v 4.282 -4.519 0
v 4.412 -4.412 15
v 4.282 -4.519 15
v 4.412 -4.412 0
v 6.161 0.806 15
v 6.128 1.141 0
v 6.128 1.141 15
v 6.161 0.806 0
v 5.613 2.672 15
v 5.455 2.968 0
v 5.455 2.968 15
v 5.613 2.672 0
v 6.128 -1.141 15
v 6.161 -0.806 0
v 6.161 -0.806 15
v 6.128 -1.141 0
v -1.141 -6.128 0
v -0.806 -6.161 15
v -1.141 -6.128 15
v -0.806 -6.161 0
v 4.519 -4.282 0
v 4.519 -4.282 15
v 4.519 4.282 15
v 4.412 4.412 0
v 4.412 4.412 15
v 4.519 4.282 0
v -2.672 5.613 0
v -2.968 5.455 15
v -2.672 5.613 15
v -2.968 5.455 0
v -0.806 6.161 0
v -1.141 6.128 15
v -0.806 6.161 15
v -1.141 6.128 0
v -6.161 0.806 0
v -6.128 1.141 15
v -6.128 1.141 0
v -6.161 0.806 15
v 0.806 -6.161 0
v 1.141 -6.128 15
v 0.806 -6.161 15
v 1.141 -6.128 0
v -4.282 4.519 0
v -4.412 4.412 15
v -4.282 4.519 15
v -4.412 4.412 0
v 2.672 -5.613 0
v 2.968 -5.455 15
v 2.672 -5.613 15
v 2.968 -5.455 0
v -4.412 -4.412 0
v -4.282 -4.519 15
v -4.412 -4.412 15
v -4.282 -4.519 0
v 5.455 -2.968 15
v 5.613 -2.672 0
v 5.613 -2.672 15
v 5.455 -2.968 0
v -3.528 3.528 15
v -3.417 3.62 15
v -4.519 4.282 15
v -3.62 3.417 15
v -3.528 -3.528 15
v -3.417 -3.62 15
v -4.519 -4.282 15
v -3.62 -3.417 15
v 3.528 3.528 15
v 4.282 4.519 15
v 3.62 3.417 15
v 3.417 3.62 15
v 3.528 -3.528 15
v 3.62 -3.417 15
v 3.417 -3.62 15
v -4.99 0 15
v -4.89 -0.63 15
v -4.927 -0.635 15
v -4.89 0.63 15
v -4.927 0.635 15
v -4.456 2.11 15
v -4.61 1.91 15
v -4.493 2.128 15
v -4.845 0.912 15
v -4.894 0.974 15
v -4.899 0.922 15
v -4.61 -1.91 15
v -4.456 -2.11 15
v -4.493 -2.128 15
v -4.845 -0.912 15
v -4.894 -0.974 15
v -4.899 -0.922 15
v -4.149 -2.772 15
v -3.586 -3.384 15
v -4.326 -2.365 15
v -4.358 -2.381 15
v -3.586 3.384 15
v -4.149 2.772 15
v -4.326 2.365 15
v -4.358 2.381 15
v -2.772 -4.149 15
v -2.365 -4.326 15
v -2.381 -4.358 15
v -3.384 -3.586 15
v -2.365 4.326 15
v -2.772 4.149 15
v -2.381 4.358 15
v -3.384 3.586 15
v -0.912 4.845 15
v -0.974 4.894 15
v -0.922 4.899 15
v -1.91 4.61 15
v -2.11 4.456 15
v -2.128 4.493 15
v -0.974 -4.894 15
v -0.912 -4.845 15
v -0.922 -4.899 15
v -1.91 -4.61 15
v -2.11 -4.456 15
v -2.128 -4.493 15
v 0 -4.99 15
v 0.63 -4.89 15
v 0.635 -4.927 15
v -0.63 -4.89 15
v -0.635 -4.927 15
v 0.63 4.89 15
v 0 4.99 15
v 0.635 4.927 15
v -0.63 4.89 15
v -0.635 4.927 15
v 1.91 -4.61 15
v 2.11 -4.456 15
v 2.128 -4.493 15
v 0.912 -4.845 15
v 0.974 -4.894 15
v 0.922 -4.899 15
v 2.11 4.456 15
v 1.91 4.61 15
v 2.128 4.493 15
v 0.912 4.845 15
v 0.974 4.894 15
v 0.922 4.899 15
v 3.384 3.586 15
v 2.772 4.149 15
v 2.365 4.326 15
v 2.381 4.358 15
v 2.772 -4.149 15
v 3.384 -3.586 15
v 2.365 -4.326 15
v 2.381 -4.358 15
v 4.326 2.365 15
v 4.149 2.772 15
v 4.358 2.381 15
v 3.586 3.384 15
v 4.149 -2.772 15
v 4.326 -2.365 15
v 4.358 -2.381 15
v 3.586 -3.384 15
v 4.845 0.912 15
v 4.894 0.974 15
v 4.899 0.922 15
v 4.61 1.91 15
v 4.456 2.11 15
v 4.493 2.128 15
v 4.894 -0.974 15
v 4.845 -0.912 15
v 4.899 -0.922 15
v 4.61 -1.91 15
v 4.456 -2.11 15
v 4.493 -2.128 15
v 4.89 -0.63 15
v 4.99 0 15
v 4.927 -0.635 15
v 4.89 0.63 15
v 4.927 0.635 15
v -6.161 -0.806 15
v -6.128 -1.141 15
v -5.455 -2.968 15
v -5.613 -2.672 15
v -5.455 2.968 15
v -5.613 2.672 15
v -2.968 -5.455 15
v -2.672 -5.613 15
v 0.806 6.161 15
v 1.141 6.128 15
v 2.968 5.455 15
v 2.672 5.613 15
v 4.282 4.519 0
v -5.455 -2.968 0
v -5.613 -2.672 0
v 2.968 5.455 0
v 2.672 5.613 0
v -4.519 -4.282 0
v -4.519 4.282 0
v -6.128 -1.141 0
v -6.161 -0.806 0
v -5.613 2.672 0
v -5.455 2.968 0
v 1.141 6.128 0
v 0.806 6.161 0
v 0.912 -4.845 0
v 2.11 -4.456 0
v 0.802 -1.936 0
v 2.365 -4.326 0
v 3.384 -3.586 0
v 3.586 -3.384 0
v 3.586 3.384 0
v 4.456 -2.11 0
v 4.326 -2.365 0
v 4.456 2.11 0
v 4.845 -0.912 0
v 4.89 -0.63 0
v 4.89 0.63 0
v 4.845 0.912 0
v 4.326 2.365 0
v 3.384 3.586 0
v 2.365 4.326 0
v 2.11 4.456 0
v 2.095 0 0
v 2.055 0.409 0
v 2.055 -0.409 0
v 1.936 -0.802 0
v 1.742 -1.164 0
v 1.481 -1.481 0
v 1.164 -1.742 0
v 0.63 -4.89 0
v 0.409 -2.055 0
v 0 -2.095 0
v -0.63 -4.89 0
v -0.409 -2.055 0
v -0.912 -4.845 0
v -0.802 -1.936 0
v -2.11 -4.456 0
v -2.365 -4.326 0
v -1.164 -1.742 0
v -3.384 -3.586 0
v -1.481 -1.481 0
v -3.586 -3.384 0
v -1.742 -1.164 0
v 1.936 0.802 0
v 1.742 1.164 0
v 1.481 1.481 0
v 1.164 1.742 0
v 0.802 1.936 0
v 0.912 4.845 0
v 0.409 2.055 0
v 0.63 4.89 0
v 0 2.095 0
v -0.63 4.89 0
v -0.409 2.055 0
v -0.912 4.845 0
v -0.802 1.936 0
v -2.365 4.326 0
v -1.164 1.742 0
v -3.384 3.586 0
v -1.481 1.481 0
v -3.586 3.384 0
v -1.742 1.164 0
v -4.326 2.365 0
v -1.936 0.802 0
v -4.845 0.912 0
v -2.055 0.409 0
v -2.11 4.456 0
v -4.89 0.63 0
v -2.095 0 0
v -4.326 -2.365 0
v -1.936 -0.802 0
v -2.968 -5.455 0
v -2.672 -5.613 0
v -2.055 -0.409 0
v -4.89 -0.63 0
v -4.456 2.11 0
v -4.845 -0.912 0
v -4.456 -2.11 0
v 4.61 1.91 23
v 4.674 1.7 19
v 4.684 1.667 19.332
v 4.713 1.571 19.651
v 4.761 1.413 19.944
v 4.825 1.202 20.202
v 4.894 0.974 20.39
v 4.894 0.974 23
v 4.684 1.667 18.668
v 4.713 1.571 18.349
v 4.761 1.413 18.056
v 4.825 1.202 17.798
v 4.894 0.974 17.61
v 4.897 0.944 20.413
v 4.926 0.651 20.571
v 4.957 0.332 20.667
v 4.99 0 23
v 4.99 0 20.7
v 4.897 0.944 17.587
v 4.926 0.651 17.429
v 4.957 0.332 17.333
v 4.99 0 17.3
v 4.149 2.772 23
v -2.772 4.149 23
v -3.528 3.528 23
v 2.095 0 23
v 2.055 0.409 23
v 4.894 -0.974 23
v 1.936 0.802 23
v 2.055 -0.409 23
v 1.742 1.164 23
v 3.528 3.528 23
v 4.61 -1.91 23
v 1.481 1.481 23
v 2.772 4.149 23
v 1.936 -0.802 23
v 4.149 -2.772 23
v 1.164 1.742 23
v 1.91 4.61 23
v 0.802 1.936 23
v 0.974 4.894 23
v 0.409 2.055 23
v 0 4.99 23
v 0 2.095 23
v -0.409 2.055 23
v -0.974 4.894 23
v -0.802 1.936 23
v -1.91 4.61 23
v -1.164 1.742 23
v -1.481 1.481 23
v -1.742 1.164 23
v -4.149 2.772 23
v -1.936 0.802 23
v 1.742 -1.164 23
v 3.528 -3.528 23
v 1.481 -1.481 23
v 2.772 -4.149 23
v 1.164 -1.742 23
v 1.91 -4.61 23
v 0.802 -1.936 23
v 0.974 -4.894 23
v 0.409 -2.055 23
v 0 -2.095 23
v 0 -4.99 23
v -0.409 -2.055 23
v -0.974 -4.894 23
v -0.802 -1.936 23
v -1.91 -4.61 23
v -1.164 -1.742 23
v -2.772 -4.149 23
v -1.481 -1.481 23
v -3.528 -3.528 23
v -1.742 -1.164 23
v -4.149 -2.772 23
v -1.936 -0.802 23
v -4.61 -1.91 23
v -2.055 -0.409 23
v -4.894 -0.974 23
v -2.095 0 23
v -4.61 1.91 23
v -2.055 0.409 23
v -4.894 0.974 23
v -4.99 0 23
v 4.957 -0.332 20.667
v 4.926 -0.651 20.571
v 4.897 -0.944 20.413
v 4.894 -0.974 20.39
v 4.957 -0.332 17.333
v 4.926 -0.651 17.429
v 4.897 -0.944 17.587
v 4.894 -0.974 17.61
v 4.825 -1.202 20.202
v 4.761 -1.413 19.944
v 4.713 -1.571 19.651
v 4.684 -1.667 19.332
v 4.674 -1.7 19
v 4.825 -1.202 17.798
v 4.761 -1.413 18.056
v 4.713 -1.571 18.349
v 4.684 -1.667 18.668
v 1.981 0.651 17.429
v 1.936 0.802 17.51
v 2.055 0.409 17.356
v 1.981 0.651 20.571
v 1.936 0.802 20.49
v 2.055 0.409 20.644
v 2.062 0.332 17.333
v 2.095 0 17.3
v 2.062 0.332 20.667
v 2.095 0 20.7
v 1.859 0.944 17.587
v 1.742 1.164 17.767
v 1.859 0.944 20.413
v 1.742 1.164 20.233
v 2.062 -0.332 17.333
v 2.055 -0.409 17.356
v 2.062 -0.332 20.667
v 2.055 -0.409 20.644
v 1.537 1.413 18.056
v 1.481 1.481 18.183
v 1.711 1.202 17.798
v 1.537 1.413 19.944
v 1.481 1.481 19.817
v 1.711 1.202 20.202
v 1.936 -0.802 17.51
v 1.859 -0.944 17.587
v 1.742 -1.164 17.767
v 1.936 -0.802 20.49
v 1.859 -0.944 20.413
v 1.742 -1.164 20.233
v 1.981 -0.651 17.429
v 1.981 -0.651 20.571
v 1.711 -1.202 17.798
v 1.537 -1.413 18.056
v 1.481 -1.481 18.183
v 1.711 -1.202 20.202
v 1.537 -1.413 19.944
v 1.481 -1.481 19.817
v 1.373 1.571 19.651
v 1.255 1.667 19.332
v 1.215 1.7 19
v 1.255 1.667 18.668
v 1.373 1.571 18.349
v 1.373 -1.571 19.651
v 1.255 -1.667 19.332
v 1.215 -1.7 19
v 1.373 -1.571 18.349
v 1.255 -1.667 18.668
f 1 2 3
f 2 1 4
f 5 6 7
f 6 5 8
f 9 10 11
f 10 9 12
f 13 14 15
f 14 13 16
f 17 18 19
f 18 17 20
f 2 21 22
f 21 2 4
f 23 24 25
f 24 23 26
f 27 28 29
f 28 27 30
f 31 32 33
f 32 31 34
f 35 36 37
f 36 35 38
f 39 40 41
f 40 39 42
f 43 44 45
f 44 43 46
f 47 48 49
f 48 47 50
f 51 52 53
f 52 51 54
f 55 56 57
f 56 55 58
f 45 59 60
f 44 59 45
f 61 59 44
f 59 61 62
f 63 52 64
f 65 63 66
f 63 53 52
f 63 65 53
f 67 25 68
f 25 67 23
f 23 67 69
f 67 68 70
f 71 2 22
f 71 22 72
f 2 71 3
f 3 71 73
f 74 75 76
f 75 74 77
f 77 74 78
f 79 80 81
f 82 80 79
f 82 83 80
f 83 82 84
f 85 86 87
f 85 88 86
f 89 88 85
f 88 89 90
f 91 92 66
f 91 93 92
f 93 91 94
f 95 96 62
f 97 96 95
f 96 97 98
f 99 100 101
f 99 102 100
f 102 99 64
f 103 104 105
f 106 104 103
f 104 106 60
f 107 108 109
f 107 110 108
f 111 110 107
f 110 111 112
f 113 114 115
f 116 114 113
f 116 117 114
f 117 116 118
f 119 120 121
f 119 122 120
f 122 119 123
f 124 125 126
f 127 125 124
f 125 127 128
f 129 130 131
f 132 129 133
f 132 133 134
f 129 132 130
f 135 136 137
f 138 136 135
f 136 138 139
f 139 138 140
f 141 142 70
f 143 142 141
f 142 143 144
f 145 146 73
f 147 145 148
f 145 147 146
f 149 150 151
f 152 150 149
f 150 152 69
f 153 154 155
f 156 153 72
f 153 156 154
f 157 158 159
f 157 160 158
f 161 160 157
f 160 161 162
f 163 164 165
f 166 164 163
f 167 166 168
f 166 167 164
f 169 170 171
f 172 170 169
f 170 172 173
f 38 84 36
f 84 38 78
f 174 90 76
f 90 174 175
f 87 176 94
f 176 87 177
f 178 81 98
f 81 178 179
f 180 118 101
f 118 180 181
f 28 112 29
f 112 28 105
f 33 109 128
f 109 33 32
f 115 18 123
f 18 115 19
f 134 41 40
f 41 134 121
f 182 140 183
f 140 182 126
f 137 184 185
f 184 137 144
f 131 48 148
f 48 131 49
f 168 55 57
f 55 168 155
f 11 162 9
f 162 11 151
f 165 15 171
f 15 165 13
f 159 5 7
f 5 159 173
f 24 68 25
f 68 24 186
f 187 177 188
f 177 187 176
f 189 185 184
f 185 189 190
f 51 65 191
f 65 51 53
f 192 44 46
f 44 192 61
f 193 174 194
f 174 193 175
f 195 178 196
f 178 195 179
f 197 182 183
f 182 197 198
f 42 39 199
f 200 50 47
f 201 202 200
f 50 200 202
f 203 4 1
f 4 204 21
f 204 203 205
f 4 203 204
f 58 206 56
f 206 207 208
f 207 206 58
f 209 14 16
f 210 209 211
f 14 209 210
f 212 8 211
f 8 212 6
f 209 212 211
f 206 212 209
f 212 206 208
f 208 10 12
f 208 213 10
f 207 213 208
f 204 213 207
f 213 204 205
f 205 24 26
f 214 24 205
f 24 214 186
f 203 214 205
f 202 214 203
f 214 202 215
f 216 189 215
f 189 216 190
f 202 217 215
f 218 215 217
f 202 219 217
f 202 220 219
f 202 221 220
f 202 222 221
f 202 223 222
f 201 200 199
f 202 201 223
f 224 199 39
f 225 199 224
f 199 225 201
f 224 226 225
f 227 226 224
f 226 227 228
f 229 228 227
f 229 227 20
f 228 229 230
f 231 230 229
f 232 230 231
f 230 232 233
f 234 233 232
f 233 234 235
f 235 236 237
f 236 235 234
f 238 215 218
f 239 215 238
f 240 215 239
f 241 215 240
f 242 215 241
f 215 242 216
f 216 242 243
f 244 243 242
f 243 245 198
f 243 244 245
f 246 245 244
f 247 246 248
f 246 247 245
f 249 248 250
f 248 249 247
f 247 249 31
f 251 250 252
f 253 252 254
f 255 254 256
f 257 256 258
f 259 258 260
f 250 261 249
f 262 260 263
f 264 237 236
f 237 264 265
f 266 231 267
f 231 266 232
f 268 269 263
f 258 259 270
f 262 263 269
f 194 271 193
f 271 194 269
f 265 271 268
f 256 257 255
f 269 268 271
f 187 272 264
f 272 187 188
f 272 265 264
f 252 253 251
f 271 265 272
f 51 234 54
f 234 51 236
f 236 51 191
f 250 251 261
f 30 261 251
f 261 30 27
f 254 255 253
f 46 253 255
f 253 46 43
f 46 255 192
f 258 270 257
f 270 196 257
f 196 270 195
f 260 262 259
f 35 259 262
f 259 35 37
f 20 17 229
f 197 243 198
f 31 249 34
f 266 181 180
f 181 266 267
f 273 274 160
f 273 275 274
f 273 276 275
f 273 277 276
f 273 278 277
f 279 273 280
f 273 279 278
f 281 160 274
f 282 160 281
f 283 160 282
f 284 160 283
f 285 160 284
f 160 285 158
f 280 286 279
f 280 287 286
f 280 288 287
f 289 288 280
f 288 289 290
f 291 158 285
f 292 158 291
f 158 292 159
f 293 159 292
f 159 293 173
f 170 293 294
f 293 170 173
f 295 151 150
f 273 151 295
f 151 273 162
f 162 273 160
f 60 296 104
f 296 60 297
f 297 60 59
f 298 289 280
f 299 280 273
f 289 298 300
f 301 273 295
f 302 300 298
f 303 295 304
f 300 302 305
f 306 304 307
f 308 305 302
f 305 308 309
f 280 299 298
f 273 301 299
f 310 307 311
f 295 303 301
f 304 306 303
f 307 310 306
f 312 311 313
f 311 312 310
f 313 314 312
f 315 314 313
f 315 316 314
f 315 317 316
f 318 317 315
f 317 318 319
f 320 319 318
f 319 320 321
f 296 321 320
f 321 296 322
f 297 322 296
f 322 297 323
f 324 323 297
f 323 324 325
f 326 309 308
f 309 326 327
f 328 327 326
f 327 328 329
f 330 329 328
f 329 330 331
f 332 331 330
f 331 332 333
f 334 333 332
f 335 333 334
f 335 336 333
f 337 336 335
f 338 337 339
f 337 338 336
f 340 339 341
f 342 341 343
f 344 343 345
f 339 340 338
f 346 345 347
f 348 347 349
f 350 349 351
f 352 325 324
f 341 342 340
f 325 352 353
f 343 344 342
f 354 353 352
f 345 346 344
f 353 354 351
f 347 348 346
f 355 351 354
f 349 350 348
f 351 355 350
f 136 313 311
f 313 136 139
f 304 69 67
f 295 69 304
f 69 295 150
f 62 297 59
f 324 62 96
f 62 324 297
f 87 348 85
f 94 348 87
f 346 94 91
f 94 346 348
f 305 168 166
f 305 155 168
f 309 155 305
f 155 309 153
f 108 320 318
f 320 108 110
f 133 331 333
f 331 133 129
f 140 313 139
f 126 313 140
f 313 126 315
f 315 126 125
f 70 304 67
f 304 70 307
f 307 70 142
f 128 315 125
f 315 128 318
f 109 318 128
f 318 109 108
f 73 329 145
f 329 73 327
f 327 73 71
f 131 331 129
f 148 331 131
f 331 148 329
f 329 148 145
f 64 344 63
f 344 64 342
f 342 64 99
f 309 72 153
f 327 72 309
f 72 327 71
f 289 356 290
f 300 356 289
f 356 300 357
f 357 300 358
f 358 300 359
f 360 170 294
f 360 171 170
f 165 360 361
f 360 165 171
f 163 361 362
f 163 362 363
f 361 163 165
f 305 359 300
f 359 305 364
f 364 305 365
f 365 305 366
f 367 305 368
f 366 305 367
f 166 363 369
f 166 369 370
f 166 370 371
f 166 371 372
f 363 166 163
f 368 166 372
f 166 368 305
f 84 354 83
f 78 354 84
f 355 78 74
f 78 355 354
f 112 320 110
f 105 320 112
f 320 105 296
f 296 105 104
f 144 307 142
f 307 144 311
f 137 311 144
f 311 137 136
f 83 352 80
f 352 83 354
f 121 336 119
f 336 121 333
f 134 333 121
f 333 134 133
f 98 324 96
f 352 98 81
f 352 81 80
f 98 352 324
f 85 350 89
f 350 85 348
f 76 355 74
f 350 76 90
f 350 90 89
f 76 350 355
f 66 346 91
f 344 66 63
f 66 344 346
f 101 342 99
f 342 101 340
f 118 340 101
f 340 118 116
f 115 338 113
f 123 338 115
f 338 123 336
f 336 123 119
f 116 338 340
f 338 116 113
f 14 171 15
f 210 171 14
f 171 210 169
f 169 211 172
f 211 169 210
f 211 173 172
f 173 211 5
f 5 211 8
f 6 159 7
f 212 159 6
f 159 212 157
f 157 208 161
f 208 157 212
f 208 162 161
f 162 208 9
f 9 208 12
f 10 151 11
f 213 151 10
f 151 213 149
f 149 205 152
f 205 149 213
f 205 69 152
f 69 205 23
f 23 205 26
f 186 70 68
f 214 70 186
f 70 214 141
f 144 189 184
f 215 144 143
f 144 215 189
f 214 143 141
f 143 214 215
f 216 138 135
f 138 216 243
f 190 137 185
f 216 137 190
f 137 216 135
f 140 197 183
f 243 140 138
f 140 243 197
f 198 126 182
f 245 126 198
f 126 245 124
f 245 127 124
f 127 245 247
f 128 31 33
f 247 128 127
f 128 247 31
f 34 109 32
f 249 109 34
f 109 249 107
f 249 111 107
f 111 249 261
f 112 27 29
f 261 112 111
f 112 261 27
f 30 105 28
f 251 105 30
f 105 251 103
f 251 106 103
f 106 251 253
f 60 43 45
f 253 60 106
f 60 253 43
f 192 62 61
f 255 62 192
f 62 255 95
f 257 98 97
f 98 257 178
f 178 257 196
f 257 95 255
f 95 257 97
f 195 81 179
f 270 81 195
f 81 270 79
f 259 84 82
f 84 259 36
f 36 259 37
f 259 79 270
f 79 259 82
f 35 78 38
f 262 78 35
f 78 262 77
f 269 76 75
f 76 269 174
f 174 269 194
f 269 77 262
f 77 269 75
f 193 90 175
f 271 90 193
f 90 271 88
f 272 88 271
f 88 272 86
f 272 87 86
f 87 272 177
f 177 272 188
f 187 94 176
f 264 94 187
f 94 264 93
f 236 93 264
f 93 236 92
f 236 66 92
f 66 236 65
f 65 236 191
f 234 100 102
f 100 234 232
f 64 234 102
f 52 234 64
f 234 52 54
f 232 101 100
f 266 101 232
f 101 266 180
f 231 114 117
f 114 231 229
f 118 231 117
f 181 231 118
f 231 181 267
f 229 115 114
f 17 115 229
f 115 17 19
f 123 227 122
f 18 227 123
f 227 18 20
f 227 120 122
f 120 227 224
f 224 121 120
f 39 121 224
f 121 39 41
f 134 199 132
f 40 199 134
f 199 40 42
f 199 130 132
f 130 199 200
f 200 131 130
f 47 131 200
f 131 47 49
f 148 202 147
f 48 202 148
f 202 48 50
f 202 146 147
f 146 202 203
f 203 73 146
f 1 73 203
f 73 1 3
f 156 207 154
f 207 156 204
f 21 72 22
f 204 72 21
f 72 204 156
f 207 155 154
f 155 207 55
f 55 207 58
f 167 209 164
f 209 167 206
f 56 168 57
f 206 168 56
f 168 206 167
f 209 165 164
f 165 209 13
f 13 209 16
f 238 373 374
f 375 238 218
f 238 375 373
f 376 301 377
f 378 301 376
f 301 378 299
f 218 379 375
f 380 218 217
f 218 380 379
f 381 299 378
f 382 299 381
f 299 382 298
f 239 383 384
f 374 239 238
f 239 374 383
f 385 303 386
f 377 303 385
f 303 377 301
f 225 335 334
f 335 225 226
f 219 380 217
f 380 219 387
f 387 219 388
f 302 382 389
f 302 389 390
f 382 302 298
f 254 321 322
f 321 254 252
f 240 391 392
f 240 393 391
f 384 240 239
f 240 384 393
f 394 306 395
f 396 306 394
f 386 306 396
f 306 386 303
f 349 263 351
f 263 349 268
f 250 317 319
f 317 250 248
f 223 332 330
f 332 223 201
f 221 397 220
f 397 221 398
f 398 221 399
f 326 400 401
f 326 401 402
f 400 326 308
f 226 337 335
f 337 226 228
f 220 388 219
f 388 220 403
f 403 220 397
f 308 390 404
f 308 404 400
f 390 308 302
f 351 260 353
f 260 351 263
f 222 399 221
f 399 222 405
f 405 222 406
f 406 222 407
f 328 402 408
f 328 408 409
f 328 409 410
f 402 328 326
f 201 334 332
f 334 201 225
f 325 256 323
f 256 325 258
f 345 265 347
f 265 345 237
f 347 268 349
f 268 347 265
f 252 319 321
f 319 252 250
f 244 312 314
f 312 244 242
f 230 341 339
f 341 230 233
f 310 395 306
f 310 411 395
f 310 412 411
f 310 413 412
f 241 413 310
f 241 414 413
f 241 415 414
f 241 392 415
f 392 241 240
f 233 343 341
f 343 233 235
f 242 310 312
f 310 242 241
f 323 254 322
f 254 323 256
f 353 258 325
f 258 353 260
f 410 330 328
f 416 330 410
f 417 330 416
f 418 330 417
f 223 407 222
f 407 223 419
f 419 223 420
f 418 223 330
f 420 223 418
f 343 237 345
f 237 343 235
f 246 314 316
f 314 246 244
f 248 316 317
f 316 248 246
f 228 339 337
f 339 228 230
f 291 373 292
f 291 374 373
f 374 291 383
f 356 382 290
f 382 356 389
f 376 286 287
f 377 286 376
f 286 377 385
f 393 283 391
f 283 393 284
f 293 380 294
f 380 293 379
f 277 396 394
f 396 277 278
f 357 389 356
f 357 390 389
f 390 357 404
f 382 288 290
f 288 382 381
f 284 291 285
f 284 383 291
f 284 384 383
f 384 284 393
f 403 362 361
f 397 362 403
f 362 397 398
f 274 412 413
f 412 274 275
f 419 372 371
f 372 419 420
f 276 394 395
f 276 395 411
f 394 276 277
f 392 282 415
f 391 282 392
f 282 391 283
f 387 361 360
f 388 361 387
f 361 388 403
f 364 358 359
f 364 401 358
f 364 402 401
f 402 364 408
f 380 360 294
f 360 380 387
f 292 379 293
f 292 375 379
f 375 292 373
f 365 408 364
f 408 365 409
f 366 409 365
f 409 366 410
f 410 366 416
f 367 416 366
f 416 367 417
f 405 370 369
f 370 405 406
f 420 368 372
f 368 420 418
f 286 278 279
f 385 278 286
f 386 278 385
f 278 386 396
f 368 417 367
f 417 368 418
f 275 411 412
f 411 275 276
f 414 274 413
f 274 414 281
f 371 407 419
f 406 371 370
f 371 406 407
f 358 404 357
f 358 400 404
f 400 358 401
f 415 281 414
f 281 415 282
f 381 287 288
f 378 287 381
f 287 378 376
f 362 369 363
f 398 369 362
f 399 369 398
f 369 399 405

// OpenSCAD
$fn = 32;

// ----------------------------------------------------------------------
// Timing pulley: GT2 20T, pitch 2 mm, 12.48 mm x 23 mm
// ----------------------------------------------------------------------

// --- parameters (mm) ---
pitch_mm = 2;             // belt pitch
tooth_count = 20;         // number of grooves
width = 15;               // belt width between the flanges
tip_d = 12.48;            // tip circle diameter
root_d = 10.98;           // groove bottom diameter
groove_h = 0.75;          // groove depth
tooth_w = 1.5;            // groove width at the tip circle
hub_bore = 4.19;          // shaft bore
hub_d = 9.98;             // hub diameter
hub_h = 8;                // hub above the flange
bottom_z = 0;             // lowest point of the pulley
top_z = 23;               // highest point of the pulley
set_d = 3.4;              // set screw tap hole

module rim() {
  cylinder(h = width, d = tip_d);
}

module groove_cutter() {
  /* belt tooth groove: deeper than wide, cut through the belt width */
  translate([root_d / 2, 0, 0])
    linear_extrude(height = width)
      polygon(points = [[-0.6, -tooth_w * 0.42], [groove_h + 0.6, -tooth_w * 0.6],
                        [groove_h + 0.6, tooth_w * 0.6], [-0.6, tooth_w * 0.42]]);
}

module hub() {
  translate([0, 0, bottom_z]) cylinder(h = top_z - bottom_z, d = hub_d);
}

difference() {
  union() {
    rim();
    hub();
  }
  for (i = [0 : tooth_count - 1]) rotate([0, 0, i * 360 / tooth_count]) groove_cutter();
  translate([0, 0, bottom_z - 1]) cylinder(h = top_z - bottom_z + 2, d = hub_bore);
  translate([-1, 0, top_z - hub_h * 0.5]) rotate([0, 90, 0]) cylinder(h = hub_d / 2 + 3, d = set_d);
}
